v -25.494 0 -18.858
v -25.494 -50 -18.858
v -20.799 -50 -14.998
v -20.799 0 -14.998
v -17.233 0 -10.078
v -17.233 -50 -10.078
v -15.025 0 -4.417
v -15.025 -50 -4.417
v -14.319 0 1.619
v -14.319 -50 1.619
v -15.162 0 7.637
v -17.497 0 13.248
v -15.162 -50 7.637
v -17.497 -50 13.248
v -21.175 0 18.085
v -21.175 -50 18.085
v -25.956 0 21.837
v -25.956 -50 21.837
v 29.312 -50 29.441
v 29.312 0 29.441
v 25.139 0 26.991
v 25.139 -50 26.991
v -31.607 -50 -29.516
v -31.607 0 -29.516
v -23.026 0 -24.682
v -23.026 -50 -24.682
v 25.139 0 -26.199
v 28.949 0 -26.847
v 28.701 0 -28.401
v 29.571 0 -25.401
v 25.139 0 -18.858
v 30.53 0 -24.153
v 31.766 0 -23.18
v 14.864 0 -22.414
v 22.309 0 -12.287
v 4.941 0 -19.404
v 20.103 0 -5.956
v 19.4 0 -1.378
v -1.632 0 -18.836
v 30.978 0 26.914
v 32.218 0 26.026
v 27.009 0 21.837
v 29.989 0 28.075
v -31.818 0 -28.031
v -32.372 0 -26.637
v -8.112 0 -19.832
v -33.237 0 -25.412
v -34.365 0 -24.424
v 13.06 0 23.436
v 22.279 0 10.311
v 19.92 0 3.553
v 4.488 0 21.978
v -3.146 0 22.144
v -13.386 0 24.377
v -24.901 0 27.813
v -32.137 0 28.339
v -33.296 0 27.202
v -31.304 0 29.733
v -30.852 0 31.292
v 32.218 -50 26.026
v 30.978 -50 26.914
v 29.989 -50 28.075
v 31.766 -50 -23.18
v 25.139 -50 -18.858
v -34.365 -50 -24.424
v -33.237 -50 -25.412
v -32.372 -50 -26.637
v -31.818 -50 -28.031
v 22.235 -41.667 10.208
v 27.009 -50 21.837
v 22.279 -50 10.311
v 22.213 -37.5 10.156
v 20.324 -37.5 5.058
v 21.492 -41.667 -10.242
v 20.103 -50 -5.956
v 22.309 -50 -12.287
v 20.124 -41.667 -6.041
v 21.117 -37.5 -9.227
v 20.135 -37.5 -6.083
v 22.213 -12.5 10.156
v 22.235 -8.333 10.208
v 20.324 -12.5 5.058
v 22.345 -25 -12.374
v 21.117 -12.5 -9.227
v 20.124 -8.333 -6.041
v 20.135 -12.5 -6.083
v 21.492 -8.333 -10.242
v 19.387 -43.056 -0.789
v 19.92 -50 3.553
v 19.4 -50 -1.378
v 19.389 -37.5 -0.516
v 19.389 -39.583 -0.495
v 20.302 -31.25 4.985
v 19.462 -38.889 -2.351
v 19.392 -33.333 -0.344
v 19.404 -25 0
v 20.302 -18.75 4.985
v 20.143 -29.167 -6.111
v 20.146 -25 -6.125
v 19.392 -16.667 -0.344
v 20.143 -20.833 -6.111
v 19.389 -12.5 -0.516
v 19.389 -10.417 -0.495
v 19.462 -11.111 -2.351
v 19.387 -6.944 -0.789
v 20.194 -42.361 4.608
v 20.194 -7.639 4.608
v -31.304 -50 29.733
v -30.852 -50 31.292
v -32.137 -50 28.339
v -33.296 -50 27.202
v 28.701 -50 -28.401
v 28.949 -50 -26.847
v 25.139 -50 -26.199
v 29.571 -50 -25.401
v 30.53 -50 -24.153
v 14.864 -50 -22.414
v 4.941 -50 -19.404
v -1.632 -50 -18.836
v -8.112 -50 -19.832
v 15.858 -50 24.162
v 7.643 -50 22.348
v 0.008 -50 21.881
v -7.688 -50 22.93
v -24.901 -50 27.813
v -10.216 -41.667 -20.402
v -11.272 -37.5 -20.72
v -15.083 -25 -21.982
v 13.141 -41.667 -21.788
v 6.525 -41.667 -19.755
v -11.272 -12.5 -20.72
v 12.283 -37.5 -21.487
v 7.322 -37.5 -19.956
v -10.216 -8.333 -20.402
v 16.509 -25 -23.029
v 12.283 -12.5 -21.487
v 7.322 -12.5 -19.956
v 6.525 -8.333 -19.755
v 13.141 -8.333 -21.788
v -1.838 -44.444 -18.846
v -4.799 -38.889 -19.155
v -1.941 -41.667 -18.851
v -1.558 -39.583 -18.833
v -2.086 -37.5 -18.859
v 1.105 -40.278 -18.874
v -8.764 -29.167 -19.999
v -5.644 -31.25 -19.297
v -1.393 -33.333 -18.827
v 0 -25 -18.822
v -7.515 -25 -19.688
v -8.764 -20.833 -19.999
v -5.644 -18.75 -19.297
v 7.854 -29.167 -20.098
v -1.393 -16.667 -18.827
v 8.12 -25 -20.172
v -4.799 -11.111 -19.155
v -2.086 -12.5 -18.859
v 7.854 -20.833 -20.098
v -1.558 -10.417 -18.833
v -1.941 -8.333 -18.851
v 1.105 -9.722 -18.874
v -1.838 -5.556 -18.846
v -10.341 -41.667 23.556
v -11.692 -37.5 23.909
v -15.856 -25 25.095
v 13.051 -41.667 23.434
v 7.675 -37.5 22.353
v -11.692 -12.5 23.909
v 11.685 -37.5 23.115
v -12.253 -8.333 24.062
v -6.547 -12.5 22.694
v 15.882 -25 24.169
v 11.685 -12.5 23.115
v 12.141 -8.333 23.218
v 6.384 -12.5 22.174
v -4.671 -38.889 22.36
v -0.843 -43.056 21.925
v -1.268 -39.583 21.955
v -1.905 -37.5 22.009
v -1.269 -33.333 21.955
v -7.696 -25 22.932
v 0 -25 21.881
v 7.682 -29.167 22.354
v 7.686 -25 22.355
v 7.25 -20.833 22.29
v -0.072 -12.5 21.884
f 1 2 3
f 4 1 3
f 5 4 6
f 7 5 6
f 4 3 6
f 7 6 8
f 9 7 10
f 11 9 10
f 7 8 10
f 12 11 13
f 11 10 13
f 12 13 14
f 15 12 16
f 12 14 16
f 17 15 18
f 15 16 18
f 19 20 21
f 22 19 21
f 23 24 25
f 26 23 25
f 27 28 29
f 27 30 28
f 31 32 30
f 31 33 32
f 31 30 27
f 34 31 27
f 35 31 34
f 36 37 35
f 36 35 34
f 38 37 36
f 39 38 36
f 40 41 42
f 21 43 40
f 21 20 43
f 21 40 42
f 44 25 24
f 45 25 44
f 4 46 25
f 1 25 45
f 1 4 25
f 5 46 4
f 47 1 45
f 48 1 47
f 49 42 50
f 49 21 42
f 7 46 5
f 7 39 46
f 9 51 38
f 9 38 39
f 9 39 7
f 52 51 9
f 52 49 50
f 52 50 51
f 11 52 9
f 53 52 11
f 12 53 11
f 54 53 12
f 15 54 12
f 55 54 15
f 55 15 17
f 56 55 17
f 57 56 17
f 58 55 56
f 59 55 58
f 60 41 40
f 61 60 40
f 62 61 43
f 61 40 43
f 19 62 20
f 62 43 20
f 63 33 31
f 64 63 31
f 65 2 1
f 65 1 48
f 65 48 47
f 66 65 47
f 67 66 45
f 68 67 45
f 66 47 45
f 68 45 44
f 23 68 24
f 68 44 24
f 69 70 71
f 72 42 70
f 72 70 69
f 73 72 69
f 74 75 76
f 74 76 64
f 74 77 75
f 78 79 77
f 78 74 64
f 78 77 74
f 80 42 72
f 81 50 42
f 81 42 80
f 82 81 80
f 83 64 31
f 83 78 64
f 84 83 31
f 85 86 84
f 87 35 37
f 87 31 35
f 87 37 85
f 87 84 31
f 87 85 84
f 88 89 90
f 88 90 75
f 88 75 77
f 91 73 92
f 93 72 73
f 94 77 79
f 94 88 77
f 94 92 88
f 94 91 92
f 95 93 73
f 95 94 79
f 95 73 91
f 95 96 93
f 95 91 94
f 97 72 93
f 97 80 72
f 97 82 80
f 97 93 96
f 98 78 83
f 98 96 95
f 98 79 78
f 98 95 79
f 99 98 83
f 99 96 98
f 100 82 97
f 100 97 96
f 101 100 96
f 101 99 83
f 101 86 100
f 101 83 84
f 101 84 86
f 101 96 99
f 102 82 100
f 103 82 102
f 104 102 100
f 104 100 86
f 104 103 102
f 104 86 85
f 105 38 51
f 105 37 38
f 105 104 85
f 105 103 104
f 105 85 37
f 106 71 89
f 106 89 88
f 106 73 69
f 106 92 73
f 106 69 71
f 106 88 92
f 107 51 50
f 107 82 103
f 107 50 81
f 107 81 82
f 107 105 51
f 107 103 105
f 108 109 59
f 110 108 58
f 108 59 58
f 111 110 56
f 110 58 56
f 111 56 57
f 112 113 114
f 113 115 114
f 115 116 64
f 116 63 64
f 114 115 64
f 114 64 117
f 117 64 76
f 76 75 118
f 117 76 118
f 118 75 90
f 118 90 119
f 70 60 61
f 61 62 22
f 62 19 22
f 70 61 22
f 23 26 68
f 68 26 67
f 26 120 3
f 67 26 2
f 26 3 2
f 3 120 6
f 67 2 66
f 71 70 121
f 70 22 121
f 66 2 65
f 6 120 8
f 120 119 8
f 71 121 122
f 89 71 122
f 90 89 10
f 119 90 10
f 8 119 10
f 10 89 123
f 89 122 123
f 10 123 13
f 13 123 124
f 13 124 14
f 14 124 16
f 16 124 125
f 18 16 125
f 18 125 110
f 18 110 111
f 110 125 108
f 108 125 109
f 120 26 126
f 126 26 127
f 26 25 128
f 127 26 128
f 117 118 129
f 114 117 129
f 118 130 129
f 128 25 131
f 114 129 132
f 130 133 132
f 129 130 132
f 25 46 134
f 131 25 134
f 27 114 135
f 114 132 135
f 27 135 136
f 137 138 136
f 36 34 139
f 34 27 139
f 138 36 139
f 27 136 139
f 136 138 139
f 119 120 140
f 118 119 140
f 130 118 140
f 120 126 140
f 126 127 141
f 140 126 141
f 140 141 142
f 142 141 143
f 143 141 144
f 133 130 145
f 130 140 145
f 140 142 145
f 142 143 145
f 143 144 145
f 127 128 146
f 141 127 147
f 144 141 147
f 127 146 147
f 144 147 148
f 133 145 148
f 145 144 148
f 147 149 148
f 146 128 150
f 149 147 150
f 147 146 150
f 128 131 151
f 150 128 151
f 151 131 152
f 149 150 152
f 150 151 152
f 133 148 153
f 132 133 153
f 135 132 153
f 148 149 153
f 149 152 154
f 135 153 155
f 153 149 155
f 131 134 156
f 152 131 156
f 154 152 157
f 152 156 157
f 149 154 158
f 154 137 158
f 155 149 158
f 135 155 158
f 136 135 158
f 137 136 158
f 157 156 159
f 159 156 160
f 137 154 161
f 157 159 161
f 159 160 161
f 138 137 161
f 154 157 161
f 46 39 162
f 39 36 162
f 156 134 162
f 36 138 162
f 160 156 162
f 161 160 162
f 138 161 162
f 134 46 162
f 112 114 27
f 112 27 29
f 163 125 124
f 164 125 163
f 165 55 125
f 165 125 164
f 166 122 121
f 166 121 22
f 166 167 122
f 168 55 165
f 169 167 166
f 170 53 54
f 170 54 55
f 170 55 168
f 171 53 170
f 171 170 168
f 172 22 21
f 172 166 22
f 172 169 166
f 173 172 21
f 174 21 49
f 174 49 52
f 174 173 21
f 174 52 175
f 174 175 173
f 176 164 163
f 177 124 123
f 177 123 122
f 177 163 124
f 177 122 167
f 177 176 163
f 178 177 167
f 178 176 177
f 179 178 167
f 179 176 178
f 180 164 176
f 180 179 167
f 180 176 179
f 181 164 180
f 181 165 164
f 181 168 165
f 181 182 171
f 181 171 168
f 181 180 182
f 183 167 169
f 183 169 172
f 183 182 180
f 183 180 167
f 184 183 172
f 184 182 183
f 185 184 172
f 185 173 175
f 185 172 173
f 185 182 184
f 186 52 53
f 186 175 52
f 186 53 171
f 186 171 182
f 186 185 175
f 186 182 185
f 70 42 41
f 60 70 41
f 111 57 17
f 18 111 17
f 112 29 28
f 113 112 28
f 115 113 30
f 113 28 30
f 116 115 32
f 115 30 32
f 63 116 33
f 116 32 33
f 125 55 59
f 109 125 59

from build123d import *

# Parameters (mm, degrees)
F1_DEPTH = 50
F3_DEPTH = 50.0010001
F4_R     = 16.0196182497
F5_DEPTH = 37.7
F6_R     = 14.0015155941
F7_DEPTH = 63


with BuildPart() as f1:
    # F0 (on Front) → F1 (new body)
    with BuildSketch(Plane.XZ):
        with BuildLine():
            add(Edge.make_bspline(
                [(-24.9009096901, 27.8132260291), (-15.2719138126, 25.0041245055), (0.0685505815, 19.3712880215), (15.1674460028, 23.7765369464), (25.1386704972, 26.9907502037)],
                knots=[0, 0, 0, 0, 0.4997319812, 1, 1, 1, 1], degree=3))
            Line((-24.9009096901, 27.8132260291), (-30.8519195794, 31.2922782778))
            ThreePointArc((-30.8519195794, 31.2922782778), (-31.6756477165, 29.0091165086), (-33.2958245412, 27.2018028212))
            Line((-33.2958245412, 27.2018028212), (-25.9555131602, 21.8371527458))
            add(Edge.make_bspline(
                [(-25.9555131602, 21.8371527458), (-22.7845221536, 13.488346606), (-17.3288820912, 0.0516611316), (-22.1761950436, -11.8040839548), (-25.4937373126, -18.8575223359)],
                knots=[0, 0, 0, 0, 0.5176887267, 1, 1, 1, 1], degree=3))
            Line((-25.4937373126, -18.8575223359), (-34.3650811811, -24.4237805158))
            ThreePointArc((-34.3650811811, -24.4237805158), (-32.3719868097, -26.6370212042), (-31.6072761212, -29.5155758903))
            Line((-31.6072761212, -29.5155758903), (-23.0260640383, -24.6824789792))
            add(Edge.make_bspline(
                [(-23.0260640383, -24.6824789792), (-14.7885032622, -22.1197617809), (-0.0436946051, -14.9712963525), (16.3980588143, -23.2713009768), (25.1386702767, -26.1990372013)],
                knots=[0, 0, 0, 0, 0.4877897865, 1, 1, 1, 1], degree=3))
            Line((25.1386702767, -26.1990372013), (28.7010856366, -28.4007272488))
            ThreePointArc((28.7010856366, -28.4007272488), (29.5711101683, -25.4013798938), (31.7657258985, -23.1795137775))
            Line((31.7657258985, -23.1795137775), (25.1386702897, -18.8575223359))
            add(Edge.make_bspline(
                [(27.0089022596, 21.8371527458), (24.067082439, 13.1959431089), (15.6637973801, 0.5258679424), (22.3337226969, -12.2190983175), (25.1386702897, -18.8575223359)],
                knots=[0, 0, 0, 0, 0.5199533553, 1, 1, 1, 1], degree=3))
            Line((27.0089022596, 21.8371527458), (32.2177472852, 26.0263319884))
            ThreePointArc((32.2177472852, 26.0263319884), (30.448037412, 27.4639143113), (29.311723773, 29.440605305))
            Line((29.311723773, 29.440605305), (25.1386704972, 26.9907502037))
        make_face()
    extrude(amount=F1_DEPTH)

    # F2 (on face) → F3 (cut, through all)
    with BuildSketch(Plane.XZ.offset(50)):
        with BuildLine():
            add(Edge.make_bspline(
                [(-25.9555131602, 21.8371527458), (-22.7845221536, 13.488346606), (-17.3288820912, 0.0516611316), (-22.1761950436, -11.8040839548), (-25.4937373126, -18.8575223359)],
                knots=[0, 0, 0, 0, 0.5176887267, 1, 1, 1, 1], degree=3))
            ThreePointArc((-25.4937373126, -18.8575223359), (-14.3192522827, 1.6192357189), (-25.9555131602, 21.8371527458))
        make_face()
    extrude(amount=-F3_DEPTH, mode=Mode.SUBTRACT)

    # F4 (on Front) → F5 (cut)
    with BuildSketch(Plane.XZ):
        with Locations((22.9763758397, 0.8501823597)):
            Circle(F4_R)
    extrude(amount=-F5_DEPTH, mode=Mode.SUBTRACT)

    # F6 (on Front) → F7 (cut)
    with BuildSketch(Plane.XZ):
        with Locations((-1.843900617, 21.1695458569)):
            Circle(F6_R)
    extrude(amount=-F7_DEPTH, mode=Mode.SUBTRACT)


solid = f1.part
